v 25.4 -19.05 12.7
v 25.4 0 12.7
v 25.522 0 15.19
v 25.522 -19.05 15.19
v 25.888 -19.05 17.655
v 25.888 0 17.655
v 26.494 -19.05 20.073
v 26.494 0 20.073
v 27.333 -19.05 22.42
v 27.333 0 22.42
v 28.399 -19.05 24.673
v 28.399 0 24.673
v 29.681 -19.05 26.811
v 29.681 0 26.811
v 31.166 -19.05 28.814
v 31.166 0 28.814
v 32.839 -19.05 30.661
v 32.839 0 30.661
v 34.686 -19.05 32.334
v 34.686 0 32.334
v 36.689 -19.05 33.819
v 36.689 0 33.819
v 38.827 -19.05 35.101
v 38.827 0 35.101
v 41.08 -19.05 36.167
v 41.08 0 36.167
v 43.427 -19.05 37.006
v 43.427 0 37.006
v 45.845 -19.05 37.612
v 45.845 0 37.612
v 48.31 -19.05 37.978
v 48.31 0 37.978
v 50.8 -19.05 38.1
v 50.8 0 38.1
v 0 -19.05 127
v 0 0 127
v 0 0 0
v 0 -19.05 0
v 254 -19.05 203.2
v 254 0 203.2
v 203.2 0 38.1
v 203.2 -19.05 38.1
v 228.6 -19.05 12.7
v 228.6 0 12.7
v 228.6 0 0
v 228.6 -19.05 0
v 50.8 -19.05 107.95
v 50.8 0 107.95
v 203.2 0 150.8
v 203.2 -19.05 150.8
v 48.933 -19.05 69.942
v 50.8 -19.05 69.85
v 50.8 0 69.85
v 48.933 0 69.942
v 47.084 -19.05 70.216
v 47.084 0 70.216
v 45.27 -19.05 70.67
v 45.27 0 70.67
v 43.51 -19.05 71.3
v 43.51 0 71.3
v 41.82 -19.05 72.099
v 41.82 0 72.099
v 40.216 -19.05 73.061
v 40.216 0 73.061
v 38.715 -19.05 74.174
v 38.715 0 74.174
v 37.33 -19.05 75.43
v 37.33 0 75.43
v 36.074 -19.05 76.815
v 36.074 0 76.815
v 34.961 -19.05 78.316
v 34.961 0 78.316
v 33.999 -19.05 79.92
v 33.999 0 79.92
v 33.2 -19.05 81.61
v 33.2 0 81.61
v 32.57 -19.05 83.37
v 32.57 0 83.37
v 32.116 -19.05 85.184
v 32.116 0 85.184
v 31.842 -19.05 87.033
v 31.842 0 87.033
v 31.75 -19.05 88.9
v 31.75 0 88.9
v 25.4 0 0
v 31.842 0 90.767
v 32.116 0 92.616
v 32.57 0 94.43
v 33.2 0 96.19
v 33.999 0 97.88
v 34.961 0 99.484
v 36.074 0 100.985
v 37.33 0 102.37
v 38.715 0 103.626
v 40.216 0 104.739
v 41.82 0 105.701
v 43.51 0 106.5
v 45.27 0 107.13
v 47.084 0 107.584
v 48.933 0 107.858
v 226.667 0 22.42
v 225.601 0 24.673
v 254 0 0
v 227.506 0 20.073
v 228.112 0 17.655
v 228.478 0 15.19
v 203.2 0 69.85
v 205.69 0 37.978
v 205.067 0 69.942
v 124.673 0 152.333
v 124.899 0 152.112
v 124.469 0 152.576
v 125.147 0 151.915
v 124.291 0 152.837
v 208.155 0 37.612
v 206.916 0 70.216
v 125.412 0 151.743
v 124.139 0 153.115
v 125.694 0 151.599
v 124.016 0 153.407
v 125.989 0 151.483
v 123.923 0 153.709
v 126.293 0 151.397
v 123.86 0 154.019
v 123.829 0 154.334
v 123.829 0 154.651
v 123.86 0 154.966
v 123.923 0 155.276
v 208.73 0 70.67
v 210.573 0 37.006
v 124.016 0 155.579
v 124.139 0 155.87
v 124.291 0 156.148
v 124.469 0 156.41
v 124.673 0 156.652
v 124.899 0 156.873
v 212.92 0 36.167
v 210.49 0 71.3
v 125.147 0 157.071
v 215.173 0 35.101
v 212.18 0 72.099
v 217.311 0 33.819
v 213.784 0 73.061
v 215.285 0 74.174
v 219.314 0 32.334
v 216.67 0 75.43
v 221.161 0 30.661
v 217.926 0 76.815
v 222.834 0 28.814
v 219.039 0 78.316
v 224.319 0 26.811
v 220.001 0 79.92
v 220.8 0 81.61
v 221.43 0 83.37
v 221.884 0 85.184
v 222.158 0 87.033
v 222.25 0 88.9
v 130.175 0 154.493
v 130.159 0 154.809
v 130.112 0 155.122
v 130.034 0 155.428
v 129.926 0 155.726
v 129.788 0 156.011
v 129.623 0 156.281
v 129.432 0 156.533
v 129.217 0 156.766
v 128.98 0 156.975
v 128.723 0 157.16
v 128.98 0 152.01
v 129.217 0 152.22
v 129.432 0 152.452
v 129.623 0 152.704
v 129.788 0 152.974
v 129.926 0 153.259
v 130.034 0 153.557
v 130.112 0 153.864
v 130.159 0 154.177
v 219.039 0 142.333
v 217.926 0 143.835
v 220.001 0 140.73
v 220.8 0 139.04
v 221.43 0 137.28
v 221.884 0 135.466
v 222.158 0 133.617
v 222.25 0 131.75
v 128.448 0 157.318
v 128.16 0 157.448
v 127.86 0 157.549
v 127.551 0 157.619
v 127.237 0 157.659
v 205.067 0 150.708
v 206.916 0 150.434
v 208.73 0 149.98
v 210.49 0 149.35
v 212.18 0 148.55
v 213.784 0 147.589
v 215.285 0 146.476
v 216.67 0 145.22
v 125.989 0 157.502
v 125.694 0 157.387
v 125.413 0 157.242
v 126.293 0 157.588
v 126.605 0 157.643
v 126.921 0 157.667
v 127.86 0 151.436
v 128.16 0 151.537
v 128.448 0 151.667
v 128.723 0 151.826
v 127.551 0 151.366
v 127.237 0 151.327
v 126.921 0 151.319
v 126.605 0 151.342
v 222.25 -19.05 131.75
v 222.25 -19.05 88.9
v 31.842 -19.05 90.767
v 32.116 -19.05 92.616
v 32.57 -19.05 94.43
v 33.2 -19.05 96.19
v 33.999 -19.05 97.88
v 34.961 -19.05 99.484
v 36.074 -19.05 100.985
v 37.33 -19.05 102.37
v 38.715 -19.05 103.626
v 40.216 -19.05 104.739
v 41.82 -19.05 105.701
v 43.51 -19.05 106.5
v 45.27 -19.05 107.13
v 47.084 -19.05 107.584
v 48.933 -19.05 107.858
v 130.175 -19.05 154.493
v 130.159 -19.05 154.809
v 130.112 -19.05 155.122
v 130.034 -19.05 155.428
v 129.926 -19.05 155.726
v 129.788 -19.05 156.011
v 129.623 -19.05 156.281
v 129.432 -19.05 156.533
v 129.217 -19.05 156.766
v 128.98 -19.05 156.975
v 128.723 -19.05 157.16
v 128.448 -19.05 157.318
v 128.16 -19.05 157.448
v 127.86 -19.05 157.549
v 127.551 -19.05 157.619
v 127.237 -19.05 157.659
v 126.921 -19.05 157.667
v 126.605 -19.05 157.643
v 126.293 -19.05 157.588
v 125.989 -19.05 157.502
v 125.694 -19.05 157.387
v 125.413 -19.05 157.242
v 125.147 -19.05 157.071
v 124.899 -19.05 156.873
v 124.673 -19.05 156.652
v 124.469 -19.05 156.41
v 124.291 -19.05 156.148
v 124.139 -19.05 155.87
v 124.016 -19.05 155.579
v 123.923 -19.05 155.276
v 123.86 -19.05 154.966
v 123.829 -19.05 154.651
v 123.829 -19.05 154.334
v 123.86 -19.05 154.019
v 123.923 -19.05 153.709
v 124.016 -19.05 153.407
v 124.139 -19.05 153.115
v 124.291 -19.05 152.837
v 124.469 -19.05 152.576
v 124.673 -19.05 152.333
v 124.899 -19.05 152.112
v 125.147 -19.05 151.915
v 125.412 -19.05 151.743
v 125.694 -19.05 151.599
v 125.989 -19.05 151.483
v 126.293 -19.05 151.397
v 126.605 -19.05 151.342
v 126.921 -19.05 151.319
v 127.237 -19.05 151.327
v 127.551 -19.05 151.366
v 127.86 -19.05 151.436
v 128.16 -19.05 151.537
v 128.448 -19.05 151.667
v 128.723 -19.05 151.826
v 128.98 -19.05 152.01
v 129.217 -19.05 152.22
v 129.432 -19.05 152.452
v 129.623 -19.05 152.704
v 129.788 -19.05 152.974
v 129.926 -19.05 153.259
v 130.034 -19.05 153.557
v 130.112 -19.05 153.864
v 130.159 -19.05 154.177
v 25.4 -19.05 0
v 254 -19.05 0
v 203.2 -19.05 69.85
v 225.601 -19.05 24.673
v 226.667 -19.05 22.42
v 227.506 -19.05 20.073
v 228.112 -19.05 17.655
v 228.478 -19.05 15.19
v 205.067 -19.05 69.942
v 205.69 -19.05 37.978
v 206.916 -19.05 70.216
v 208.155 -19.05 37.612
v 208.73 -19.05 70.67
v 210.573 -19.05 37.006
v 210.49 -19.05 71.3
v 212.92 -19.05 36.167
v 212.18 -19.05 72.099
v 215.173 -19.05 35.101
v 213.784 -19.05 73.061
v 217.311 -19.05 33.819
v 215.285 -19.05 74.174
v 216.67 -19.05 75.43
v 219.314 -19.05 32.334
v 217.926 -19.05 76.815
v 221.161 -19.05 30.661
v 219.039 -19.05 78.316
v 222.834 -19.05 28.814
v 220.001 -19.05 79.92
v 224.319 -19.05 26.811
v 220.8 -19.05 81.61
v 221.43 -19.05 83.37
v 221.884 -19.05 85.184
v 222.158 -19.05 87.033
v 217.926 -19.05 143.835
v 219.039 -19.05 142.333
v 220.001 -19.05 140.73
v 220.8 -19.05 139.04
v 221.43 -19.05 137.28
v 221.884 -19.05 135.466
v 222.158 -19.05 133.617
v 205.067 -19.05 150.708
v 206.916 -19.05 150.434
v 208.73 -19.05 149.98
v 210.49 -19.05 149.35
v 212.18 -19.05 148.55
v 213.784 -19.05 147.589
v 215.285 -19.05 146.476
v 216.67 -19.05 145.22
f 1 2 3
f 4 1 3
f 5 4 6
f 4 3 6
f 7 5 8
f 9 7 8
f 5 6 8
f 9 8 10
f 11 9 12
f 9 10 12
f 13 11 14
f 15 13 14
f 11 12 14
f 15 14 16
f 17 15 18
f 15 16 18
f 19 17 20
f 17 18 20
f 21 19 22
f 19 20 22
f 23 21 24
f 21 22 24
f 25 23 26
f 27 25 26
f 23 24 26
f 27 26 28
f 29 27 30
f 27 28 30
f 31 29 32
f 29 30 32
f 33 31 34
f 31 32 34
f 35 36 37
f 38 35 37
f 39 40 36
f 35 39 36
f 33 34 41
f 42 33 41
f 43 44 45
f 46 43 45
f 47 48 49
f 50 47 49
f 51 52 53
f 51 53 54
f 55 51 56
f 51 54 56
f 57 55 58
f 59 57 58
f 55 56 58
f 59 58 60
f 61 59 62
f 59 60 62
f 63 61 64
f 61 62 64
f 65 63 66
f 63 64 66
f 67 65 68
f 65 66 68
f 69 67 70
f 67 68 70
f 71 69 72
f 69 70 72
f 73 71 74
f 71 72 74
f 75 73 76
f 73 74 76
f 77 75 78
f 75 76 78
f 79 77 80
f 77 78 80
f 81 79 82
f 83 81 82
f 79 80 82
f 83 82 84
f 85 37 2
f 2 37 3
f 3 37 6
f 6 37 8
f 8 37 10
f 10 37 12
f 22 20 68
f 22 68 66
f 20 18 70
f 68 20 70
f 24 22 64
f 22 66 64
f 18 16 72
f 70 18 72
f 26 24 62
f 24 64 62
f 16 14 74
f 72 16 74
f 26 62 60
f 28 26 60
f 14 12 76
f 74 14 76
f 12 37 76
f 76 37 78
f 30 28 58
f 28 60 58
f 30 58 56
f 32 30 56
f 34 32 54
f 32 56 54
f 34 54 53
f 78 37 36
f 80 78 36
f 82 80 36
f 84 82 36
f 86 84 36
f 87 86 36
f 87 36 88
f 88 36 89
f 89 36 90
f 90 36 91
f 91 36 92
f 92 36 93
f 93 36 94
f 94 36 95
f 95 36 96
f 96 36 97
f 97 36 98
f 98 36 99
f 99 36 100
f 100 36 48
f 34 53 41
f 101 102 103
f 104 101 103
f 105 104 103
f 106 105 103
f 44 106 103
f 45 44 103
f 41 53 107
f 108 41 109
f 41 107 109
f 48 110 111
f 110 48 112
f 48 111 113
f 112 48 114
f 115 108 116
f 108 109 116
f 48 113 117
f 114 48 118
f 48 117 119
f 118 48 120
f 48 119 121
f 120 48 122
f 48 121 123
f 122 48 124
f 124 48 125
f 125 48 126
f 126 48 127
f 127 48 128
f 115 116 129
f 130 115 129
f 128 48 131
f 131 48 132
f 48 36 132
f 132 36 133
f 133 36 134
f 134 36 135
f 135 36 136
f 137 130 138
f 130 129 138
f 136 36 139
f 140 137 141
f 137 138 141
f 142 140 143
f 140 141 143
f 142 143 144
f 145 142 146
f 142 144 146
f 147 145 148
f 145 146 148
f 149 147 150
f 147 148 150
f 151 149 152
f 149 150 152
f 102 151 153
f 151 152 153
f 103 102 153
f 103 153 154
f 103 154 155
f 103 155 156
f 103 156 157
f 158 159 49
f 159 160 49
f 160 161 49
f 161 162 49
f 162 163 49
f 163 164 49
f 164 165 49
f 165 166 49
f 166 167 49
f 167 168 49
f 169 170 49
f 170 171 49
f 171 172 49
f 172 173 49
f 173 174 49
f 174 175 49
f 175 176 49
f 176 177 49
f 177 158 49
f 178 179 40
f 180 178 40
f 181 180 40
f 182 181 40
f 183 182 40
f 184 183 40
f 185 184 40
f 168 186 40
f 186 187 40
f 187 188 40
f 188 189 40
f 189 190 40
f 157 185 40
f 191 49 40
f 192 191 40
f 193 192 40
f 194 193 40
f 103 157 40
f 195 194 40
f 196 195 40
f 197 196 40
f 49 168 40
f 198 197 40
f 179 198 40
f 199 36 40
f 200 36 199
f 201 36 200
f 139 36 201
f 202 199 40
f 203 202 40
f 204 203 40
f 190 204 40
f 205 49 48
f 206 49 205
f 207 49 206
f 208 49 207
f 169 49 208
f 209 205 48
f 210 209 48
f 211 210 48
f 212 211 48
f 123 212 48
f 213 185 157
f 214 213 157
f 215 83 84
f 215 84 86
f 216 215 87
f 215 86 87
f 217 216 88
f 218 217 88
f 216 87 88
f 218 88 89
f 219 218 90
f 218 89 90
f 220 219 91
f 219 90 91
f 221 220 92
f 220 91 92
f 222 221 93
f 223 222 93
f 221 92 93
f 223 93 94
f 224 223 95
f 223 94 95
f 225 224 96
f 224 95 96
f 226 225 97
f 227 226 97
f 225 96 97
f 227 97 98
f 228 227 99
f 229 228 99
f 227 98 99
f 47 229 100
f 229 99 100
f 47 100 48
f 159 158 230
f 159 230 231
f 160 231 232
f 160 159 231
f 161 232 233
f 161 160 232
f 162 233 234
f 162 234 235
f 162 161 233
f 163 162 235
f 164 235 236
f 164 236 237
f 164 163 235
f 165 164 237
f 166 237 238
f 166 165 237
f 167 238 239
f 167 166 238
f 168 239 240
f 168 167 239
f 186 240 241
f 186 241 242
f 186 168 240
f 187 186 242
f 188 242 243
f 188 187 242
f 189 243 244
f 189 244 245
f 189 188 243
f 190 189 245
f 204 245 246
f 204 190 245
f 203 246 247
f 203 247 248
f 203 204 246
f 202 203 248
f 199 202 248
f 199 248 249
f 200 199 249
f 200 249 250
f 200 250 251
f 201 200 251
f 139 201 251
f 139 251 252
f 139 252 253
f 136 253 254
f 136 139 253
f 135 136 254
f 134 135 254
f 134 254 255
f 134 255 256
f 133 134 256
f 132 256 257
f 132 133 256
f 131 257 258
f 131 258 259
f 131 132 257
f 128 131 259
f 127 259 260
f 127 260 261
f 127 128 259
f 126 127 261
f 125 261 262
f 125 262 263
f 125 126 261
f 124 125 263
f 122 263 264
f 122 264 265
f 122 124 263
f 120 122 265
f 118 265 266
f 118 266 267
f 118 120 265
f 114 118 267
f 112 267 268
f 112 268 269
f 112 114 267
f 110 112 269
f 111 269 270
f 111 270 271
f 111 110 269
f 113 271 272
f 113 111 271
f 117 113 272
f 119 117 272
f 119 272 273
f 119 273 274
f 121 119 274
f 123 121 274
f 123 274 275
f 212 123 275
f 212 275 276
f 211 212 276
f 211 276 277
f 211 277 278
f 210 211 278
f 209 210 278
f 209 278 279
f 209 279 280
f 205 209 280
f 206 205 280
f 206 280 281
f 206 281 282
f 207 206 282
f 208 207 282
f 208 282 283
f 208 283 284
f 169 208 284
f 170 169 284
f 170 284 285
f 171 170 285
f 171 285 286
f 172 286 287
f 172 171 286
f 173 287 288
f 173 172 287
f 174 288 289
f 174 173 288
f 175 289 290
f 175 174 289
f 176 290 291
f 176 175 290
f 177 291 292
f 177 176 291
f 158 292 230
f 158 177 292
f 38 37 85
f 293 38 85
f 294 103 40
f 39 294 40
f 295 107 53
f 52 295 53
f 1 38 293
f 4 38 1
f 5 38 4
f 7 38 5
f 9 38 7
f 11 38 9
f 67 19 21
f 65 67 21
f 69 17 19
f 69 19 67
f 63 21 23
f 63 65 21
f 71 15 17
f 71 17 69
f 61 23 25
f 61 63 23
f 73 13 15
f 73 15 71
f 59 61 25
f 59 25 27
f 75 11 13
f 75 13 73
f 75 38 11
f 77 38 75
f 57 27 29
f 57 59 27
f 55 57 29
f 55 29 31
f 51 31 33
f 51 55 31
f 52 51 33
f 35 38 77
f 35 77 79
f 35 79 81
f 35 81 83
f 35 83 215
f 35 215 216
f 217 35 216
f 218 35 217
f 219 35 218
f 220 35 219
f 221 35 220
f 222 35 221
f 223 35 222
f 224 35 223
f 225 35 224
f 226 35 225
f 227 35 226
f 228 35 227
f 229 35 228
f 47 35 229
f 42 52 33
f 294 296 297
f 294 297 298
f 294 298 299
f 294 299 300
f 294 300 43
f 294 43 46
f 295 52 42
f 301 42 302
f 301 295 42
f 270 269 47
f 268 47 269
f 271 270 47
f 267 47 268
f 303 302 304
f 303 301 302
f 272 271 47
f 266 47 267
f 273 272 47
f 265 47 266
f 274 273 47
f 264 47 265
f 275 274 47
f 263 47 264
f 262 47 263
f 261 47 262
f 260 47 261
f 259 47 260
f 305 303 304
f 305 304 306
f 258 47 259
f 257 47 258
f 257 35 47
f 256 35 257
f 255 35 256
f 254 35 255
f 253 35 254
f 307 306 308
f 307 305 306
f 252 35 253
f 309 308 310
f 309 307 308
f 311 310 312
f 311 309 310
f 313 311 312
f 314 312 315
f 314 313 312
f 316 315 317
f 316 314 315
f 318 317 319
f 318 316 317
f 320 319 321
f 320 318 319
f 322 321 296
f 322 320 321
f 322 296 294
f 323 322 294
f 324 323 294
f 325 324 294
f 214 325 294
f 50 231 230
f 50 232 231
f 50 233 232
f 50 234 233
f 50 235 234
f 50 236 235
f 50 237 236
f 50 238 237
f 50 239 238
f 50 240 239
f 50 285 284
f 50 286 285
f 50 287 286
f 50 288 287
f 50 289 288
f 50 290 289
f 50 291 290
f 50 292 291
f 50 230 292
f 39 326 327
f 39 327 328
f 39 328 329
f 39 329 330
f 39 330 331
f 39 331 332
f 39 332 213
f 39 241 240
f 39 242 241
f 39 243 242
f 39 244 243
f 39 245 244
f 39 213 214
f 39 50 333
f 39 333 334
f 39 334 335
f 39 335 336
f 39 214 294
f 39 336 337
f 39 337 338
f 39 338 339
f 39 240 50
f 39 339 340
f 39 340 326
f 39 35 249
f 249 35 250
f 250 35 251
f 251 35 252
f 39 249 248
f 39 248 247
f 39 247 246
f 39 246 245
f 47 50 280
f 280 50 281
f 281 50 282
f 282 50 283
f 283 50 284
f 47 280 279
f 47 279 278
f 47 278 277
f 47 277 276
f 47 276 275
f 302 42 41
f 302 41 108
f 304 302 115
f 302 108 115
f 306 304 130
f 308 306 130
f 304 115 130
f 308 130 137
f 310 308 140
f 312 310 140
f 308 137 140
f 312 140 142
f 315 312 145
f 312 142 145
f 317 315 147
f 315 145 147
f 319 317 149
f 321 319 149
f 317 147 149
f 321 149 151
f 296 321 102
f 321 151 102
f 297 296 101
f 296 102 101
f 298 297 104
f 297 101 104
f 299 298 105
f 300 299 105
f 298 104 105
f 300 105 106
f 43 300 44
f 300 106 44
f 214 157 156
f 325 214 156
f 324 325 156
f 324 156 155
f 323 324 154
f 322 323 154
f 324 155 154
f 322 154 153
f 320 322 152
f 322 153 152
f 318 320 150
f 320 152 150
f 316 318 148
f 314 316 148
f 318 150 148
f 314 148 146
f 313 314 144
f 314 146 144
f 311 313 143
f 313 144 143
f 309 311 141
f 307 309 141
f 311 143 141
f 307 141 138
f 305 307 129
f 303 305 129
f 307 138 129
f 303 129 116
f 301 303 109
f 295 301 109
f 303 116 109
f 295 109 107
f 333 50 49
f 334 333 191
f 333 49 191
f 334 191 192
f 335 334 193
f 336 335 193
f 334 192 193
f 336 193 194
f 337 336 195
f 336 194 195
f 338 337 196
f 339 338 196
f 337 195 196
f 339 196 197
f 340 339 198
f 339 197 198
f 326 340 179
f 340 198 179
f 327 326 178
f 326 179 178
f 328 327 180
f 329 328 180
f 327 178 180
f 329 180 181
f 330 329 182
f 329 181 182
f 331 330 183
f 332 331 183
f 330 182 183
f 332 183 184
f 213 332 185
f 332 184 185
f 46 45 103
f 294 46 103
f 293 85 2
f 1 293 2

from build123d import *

# Parameters (mm, degrees)
F0_R     = 3.175
F1_DEPTH = 19.05


with BuildPart() as f1:
    # F0 (on Front) → F1 (new body)
    with BuildSketch(Plane.XZ):
        with BuildLine():
            Line((0, 127), (0, 0))
            Line((0, 0), (25.4, 0))
            Line((25.4, 0), (25.4, 12.7))
            ThreePointArc((25.4, 12.7), (32.839488, 30.660512), (50.8, 38.1))
            Line((50.8, 38.1), (203.2, 38.1))
            ThreePointArc((203.2, 38.1), (221.160512, 30.660512), (228.6, 12.7))
            Line((228.6, 12.7), (228.6, 0))
            Line((228.6, 0), (254, 0))
            Line((254, 0), (254, 203.2))
            Line((254, 203.2), (0, 127))
        make_face()
        with BuildLine():
            ThreePointArc((222.25, 88.9), (216.670384, 75.429616), (203.2, 69.85))
            Line((203.2, 69.85), (50.8, 69.85))
            ThreePointArc((50.8, 69.85), (37.329616, 75.429616), (31.75, 88.9))
            ThreePointArc((31.75, 88.9), (37.329616, 102.370384), (50.8, 107.95))
            Line((50.8, 107.95), (203.2, 150.7998))
            ThreePointArc((203.2, 150.7998), (216.670384, 145.220184), (222.25, 131.7498))
            Line((222.25, 131.7498), (222.25, 88.9))
        make_face(mode=Mode.SUBTRACT)
        with Locations((127, 154.492649)):
            Circle(F0_R, mode=Mode.SUBTRACT)
    extrude(amount=F1_DEPTH)


solid = f1.part
